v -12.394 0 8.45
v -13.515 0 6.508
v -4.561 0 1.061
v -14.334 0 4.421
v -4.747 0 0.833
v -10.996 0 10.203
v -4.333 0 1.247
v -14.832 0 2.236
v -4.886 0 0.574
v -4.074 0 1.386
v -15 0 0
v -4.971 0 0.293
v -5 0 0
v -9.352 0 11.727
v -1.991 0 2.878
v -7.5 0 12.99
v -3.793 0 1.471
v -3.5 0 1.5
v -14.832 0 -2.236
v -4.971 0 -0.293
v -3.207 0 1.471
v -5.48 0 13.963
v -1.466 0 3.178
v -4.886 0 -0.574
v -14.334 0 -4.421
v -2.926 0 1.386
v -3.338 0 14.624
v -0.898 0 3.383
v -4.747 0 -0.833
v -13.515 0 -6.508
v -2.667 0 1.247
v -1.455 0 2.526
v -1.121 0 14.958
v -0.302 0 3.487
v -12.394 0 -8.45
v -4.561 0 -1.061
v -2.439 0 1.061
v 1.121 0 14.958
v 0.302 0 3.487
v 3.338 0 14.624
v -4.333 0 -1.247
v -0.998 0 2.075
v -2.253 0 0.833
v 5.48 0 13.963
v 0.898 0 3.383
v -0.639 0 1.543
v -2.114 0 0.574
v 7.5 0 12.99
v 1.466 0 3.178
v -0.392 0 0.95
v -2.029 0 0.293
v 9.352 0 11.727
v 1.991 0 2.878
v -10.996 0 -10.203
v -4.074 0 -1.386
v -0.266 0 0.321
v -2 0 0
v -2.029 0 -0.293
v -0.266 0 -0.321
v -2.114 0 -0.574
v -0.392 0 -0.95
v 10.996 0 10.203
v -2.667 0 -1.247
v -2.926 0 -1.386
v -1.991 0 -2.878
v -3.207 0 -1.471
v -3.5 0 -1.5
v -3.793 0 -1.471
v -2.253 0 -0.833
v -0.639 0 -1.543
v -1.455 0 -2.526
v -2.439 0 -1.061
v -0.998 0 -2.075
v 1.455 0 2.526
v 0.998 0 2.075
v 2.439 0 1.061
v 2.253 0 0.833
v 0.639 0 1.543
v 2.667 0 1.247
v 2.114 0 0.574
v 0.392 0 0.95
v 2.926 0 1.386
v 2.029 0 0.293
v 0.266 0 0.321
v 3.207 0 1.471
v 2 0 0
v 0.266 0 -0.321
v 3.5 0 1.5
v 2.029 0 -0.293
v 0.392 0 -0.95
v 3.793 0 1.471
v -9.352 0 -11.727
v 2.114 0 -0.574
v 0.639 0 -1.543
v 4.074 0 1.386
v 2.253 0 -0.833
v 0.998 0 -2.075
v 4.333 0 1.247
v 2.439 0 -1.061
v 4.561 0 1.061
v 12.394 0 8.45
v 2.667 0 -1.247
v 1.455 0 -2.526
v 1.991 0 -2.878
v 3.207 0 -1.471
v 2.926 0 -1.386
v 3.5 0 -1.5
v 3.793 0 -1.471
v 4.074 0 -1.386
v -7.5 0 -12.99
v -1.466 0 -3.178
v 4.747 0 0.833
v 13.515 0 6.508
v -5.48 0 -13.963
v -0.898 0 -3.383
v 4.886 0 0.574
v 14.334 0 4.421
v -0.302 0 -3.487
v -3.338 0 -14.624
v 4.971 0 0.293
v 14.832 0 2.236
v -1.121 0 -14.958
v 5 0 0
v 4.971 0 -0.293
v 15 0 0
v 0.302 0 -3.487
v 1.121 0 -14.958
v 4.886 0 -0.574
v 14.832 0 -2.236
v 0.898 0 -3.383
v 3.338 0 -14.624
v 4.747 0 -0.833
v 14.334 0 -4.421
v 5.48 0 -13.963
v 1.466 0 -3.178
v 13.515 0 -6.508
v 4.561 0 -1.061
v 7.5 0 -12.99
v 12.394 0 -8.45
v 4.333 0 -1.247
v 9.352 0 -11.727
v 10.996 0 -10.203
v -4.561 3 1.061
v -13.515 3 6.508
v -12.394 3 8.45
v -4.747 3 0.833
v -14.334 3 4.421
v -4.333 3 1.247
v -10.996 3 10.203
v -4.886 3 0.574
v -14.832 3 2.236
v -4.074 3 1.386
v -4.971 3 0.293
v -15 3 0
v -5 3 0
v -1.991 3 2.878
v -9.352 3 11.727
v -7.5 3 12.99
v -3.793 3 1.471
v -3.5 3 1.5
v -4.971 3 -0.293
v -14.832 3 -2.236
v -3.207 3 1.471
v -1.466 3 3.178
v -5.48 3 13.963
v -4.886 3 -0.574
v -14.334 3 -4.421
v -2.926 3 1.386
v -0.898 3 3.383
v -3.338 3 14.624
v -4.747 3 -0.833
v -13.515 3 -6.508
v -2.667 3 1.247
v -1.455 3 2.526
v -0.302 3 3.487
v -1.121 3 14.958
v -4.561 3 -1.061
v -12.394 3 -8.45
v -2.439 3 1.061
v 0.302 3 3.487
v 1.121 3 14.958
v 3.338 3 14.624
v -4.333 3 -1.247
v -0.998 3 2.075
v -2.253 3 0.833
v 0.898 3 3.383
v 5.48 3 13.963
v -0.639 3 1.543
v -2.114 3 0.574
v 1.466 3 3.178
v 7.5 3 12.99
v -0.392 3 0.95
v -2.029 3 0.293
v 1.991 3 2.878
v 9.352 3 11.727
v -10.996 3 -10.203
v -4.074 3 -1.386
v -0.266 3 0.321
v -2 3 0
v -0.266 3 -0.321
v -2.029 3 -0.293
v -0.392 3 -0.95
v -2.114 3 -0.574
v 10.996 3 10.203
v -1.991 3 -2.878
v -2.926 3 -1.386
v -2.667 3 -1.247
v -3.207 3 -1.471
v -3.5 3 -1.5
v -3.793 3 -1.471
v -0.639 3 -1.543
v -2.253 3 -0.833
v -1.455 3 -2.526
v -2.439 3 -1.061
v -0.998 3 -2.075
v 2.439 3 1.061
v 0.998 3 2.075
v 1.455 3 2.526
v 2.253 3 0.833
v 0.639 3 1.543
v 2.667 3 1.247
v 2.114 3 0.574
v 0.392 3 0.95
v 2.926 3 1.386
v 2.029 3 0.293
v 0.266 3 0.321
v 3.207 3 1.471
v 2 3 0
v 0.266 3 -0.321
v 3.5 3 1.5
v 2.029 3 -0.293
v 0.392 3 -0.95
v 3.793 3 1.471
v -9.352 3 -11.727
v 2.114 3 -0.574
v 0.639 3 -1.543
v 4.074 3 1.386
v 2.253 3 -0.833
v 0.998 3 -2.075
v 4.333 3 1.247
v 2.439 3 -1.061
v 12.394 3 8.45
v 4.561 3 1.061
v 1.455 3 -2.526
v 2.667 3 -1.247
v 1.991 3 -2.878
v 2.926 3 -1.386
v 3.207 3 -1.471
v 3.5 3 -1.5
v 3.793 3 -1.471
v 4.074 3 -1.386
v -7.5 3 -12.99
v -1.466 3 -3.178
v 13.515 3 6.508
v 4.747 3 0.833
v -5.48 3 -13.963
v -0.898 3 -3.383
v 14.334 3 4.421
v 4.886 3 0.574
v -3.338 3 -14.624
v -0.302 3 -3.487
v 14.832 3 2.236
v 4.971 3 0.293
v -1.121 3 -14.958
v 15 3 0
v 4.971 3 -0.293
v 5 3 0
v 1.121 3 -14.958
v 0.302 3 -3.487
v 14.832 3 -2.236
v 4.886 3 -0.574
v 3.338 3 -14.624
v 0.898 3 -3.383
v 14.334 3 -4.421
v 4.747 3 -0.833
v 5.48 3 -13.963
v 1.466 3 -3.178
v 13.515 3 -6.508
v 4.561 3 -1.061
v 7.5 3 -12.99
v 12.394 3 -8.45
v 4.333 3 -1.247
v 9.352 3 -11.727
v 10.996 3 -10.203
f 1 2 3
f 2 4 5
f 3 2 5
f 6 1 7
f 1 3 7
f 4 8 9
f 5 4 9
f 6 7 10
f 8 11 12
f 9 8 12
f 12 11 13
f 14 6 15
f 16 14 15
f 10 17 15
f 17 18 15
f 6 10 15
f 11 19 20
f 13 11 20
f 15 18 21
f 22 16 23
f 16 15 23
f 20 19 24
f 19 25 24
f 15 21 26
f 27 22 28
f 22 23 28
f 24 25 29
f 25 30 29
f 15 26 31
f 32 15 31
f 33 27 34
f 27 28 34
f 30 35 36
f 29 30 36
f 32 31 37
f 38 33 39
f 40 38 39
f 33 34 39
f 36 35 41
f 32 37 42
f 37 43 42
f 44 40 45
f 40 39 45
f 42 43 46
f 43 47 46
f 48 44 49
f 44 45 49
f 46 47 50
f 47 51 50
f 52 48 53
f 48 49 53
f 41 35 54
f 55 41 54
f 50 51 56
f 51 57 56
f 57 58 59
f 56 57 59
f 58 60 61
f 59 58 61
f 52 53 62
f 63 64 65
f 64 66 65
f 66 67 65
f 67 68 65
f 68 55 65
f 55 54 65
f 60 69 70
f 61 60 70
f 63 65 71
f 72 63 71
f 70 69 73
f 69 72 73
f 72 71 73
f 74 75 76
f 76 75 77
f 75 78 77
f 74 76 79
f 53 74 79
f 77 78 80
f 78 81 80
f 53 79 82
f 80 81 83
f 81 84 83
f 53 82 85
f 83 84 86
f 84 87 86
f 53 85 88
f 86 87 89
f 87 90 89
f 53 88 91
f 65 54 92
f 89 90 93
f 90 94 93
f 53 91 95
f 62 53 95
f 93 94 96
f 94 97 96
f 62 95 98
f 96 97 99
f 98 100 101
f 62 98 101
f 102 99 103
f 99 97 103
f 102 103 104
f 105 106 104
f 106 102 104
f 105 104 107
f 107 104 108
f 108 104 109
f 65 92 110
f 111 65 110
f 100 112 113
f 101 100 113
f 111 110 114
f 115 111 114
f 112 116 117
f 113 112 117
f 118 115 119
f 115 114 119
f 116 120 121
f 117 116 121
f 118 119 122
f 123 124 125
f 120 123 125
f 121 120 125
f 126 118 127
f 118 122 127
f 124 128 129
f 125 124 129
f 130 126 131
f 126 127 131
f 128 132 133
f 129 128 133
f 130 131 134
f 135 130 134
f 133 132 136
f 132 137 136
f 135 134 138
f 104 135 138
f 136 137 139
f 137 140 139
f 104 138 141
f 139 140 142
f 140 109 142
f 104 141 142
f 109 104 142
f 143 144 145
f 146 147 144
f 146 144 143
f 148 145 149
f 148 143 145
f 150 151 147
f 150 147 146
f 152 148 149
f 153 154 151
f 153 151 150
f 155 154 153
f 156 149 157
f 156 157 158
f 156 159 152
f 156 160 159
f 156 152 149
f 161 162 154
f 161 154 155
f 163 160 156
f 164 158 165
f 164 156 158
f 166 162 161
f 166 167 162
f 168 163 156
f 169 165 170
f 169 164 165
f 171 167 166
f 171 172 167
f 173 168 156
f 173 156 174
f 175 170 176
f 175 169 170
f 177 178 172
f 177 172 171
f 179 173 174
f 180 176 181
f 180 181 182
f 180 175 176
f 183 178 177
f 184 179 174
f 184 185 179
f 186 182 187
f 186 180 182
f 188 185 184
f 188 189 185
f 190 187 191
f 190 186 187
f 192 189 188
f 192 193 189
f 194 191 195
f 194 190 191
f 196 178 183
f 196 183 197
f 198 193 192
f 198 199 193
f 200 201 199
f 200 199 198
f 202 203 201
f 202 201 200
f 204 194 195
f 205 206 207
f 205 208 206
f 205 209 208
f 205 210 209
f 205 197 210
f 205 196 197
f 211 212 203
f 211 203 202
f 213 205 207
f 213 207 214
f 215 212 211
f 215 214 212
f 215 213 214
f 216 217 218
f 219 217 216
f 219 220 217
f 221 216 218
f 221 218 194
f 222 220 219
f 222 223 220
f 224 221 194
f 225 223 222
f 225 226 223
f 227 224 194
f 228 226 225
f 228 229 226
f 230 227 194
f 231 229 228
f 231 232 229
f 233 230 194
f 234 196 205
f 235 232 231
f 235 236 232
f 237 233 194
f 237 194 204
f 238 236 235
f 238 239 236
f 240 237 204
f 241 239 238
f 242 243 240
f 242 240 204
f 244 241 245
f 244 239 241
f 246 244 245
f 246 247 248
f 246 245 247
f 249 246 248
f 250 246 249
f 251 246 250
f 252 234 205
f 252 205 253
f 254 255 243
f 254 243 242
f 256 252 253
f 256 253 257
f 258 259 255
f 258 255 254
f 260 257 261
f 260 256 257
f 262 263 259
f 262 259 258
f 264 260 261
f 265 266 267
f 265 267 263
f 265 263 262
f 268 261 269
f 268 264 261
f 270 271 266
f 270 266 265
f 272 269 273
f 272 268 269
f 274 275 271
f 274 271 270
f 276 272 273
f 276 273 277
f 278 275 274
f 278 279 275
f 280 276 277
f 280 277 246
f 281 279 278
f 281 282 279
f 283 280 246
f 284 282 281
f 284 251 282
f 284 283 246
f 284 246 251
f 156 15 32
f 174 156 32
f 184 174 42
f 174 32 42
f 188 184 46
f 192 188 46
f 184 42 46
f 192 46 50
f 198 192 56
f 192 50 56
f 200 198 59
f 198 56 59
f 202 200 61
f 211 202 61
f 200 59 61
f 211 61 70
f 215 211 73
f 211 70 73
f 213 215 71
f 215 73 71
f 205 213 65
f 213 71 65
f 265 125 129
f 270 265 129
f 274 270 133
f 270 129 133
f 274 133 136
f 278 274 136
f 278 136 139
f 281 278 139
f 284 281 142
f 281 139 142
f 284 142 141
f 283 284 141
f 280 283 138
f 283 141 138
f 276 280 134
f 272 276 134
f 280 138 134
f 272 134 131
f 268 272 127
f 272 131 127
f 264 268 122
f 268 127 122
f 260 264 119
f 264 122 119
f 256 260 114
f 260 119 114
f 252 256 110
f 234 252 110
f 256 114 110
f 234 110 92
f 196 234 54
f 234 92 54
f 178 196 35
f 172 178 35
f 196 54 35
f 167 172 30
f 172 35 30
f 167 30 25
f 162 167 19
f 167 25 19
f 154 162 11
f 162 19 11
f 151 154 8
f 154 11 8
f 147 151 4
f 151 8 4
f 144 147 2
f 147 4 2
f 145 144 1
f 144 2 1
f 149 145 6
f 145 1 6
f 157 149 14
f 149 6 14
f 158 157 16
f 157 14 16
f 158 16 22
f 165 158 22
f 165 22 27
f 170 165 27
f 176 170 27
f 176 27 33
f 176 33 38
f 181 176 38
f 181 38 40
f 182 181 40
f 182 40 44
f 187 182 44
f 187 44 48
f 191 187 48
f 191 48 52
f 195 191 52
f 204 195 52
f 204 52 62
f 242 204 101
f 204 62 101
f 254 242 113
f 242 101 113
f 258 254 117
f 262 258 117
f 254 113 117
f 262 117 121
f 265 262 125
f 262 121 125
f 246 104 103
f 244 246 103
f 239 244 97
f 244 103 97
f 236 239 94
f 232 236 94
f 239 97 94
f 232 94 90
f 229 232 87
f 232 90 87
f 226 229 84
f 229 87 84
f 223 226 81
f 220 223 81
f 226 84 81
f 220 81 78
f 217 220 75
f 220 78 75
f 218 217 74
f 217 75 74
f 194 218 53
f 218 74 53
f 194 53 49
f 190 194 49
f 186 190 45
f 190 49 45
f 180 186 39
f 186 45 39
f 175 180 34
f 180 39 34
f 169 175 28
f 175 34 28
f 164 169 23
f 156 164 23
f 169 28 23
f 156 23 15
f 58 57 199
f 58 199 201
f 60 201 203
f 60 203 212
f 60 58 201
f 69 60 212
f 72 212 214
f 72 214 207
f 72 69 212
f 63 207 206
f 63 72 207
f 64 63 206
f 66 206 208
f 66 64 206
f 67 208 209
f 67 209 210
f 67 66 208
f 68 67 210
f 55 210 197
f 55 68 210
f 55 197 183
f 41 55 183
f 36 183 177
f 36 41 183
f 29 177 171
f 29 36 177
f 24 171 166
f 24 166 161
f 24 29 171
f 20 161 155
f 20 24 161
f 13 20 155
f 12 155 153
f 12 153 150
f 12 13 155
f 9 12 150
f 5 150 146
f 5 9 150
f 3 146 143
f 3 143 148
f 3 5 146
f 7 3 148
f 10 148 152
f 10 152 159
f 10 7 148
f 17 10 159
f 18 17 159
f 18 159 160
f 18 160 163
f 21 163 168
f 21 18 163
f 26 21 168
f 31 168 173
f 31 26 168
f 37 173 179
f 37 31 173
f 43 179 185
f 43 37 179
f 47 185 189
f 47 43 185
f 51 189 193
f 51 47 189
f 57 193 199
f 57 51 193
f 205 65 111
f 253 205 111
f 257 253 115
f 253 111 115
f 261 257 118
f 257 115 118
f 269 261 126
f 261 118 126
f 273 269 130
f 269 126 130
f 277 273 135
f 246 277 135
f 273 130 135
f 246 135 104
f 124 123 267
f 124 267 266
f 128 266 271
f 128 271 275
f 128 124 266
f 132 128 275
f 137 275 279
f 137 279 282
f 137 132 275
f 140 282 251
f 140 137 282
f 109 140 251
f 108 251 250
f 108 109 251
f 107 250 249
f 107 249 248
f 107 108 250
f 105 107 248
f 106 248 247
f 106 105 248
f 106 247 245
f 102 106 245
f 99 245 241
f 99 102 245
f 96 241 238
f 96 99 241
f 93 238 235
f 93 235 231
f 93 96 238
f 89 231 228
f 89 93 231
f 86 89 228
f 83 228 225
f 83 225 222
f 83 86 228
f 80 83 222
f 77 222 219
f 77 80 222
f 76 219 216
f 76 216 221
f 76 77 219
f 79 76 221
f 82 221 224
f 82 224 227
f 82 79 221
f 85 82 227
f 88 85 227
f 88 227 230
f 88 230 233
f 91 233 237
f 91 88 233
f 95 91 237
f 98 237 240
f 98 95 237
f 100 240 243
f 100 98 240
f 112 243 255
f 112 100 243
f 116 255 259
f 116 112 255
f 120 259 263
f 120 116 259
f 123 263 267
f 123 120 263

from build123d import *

# Parameters (mm, degrees)
ESQUISSE1_R        = 15
ESQUISSE1_R_2      = 1.5
BOSS_EXTRU_1_DEPTH = 3


with BuildPart() as part:
    # Esquisse1 → Boss.-Extru.1 (new body)
    with BuildSketch(Plane(origin=(0, 0, 0), x_dir=(1, 0, 0), z_dir=(0, 1, 0))):
        Circle(ESQUISSE1_R)
        with Locations((-3.5, 0)):
            Circle(ESQUISSE1_R_2, mode=Mode.SUBTRACT)
        with Locations((3.5, 0)):
            Circle(ESQUISSE1_R_2, mode=Mode.SUBTRACT)
        with BuildLine():
            ThreePointArc((1.991071429, 2.878477821), (0.25, 0), (1.991071429, -2.878477821))
            ThreePointArc((1.991071429, -2.878477821), (0, -3.5), (-1.991071429, -2.878477821))
            ThreePointArc((-1.991071429, -2.878477821), (-0.25, 0), (-1.991071429, 2.878477821))
            ThreePointArc((-1.991071429, 2.878477821), (0, 3.5), (1.991071429, 2.878477821))
        make_face(mode=Mode.SUBTRACT)
    extrude(amount=BOSS_EXTRU_1_DEPTH)


solid = part.part
